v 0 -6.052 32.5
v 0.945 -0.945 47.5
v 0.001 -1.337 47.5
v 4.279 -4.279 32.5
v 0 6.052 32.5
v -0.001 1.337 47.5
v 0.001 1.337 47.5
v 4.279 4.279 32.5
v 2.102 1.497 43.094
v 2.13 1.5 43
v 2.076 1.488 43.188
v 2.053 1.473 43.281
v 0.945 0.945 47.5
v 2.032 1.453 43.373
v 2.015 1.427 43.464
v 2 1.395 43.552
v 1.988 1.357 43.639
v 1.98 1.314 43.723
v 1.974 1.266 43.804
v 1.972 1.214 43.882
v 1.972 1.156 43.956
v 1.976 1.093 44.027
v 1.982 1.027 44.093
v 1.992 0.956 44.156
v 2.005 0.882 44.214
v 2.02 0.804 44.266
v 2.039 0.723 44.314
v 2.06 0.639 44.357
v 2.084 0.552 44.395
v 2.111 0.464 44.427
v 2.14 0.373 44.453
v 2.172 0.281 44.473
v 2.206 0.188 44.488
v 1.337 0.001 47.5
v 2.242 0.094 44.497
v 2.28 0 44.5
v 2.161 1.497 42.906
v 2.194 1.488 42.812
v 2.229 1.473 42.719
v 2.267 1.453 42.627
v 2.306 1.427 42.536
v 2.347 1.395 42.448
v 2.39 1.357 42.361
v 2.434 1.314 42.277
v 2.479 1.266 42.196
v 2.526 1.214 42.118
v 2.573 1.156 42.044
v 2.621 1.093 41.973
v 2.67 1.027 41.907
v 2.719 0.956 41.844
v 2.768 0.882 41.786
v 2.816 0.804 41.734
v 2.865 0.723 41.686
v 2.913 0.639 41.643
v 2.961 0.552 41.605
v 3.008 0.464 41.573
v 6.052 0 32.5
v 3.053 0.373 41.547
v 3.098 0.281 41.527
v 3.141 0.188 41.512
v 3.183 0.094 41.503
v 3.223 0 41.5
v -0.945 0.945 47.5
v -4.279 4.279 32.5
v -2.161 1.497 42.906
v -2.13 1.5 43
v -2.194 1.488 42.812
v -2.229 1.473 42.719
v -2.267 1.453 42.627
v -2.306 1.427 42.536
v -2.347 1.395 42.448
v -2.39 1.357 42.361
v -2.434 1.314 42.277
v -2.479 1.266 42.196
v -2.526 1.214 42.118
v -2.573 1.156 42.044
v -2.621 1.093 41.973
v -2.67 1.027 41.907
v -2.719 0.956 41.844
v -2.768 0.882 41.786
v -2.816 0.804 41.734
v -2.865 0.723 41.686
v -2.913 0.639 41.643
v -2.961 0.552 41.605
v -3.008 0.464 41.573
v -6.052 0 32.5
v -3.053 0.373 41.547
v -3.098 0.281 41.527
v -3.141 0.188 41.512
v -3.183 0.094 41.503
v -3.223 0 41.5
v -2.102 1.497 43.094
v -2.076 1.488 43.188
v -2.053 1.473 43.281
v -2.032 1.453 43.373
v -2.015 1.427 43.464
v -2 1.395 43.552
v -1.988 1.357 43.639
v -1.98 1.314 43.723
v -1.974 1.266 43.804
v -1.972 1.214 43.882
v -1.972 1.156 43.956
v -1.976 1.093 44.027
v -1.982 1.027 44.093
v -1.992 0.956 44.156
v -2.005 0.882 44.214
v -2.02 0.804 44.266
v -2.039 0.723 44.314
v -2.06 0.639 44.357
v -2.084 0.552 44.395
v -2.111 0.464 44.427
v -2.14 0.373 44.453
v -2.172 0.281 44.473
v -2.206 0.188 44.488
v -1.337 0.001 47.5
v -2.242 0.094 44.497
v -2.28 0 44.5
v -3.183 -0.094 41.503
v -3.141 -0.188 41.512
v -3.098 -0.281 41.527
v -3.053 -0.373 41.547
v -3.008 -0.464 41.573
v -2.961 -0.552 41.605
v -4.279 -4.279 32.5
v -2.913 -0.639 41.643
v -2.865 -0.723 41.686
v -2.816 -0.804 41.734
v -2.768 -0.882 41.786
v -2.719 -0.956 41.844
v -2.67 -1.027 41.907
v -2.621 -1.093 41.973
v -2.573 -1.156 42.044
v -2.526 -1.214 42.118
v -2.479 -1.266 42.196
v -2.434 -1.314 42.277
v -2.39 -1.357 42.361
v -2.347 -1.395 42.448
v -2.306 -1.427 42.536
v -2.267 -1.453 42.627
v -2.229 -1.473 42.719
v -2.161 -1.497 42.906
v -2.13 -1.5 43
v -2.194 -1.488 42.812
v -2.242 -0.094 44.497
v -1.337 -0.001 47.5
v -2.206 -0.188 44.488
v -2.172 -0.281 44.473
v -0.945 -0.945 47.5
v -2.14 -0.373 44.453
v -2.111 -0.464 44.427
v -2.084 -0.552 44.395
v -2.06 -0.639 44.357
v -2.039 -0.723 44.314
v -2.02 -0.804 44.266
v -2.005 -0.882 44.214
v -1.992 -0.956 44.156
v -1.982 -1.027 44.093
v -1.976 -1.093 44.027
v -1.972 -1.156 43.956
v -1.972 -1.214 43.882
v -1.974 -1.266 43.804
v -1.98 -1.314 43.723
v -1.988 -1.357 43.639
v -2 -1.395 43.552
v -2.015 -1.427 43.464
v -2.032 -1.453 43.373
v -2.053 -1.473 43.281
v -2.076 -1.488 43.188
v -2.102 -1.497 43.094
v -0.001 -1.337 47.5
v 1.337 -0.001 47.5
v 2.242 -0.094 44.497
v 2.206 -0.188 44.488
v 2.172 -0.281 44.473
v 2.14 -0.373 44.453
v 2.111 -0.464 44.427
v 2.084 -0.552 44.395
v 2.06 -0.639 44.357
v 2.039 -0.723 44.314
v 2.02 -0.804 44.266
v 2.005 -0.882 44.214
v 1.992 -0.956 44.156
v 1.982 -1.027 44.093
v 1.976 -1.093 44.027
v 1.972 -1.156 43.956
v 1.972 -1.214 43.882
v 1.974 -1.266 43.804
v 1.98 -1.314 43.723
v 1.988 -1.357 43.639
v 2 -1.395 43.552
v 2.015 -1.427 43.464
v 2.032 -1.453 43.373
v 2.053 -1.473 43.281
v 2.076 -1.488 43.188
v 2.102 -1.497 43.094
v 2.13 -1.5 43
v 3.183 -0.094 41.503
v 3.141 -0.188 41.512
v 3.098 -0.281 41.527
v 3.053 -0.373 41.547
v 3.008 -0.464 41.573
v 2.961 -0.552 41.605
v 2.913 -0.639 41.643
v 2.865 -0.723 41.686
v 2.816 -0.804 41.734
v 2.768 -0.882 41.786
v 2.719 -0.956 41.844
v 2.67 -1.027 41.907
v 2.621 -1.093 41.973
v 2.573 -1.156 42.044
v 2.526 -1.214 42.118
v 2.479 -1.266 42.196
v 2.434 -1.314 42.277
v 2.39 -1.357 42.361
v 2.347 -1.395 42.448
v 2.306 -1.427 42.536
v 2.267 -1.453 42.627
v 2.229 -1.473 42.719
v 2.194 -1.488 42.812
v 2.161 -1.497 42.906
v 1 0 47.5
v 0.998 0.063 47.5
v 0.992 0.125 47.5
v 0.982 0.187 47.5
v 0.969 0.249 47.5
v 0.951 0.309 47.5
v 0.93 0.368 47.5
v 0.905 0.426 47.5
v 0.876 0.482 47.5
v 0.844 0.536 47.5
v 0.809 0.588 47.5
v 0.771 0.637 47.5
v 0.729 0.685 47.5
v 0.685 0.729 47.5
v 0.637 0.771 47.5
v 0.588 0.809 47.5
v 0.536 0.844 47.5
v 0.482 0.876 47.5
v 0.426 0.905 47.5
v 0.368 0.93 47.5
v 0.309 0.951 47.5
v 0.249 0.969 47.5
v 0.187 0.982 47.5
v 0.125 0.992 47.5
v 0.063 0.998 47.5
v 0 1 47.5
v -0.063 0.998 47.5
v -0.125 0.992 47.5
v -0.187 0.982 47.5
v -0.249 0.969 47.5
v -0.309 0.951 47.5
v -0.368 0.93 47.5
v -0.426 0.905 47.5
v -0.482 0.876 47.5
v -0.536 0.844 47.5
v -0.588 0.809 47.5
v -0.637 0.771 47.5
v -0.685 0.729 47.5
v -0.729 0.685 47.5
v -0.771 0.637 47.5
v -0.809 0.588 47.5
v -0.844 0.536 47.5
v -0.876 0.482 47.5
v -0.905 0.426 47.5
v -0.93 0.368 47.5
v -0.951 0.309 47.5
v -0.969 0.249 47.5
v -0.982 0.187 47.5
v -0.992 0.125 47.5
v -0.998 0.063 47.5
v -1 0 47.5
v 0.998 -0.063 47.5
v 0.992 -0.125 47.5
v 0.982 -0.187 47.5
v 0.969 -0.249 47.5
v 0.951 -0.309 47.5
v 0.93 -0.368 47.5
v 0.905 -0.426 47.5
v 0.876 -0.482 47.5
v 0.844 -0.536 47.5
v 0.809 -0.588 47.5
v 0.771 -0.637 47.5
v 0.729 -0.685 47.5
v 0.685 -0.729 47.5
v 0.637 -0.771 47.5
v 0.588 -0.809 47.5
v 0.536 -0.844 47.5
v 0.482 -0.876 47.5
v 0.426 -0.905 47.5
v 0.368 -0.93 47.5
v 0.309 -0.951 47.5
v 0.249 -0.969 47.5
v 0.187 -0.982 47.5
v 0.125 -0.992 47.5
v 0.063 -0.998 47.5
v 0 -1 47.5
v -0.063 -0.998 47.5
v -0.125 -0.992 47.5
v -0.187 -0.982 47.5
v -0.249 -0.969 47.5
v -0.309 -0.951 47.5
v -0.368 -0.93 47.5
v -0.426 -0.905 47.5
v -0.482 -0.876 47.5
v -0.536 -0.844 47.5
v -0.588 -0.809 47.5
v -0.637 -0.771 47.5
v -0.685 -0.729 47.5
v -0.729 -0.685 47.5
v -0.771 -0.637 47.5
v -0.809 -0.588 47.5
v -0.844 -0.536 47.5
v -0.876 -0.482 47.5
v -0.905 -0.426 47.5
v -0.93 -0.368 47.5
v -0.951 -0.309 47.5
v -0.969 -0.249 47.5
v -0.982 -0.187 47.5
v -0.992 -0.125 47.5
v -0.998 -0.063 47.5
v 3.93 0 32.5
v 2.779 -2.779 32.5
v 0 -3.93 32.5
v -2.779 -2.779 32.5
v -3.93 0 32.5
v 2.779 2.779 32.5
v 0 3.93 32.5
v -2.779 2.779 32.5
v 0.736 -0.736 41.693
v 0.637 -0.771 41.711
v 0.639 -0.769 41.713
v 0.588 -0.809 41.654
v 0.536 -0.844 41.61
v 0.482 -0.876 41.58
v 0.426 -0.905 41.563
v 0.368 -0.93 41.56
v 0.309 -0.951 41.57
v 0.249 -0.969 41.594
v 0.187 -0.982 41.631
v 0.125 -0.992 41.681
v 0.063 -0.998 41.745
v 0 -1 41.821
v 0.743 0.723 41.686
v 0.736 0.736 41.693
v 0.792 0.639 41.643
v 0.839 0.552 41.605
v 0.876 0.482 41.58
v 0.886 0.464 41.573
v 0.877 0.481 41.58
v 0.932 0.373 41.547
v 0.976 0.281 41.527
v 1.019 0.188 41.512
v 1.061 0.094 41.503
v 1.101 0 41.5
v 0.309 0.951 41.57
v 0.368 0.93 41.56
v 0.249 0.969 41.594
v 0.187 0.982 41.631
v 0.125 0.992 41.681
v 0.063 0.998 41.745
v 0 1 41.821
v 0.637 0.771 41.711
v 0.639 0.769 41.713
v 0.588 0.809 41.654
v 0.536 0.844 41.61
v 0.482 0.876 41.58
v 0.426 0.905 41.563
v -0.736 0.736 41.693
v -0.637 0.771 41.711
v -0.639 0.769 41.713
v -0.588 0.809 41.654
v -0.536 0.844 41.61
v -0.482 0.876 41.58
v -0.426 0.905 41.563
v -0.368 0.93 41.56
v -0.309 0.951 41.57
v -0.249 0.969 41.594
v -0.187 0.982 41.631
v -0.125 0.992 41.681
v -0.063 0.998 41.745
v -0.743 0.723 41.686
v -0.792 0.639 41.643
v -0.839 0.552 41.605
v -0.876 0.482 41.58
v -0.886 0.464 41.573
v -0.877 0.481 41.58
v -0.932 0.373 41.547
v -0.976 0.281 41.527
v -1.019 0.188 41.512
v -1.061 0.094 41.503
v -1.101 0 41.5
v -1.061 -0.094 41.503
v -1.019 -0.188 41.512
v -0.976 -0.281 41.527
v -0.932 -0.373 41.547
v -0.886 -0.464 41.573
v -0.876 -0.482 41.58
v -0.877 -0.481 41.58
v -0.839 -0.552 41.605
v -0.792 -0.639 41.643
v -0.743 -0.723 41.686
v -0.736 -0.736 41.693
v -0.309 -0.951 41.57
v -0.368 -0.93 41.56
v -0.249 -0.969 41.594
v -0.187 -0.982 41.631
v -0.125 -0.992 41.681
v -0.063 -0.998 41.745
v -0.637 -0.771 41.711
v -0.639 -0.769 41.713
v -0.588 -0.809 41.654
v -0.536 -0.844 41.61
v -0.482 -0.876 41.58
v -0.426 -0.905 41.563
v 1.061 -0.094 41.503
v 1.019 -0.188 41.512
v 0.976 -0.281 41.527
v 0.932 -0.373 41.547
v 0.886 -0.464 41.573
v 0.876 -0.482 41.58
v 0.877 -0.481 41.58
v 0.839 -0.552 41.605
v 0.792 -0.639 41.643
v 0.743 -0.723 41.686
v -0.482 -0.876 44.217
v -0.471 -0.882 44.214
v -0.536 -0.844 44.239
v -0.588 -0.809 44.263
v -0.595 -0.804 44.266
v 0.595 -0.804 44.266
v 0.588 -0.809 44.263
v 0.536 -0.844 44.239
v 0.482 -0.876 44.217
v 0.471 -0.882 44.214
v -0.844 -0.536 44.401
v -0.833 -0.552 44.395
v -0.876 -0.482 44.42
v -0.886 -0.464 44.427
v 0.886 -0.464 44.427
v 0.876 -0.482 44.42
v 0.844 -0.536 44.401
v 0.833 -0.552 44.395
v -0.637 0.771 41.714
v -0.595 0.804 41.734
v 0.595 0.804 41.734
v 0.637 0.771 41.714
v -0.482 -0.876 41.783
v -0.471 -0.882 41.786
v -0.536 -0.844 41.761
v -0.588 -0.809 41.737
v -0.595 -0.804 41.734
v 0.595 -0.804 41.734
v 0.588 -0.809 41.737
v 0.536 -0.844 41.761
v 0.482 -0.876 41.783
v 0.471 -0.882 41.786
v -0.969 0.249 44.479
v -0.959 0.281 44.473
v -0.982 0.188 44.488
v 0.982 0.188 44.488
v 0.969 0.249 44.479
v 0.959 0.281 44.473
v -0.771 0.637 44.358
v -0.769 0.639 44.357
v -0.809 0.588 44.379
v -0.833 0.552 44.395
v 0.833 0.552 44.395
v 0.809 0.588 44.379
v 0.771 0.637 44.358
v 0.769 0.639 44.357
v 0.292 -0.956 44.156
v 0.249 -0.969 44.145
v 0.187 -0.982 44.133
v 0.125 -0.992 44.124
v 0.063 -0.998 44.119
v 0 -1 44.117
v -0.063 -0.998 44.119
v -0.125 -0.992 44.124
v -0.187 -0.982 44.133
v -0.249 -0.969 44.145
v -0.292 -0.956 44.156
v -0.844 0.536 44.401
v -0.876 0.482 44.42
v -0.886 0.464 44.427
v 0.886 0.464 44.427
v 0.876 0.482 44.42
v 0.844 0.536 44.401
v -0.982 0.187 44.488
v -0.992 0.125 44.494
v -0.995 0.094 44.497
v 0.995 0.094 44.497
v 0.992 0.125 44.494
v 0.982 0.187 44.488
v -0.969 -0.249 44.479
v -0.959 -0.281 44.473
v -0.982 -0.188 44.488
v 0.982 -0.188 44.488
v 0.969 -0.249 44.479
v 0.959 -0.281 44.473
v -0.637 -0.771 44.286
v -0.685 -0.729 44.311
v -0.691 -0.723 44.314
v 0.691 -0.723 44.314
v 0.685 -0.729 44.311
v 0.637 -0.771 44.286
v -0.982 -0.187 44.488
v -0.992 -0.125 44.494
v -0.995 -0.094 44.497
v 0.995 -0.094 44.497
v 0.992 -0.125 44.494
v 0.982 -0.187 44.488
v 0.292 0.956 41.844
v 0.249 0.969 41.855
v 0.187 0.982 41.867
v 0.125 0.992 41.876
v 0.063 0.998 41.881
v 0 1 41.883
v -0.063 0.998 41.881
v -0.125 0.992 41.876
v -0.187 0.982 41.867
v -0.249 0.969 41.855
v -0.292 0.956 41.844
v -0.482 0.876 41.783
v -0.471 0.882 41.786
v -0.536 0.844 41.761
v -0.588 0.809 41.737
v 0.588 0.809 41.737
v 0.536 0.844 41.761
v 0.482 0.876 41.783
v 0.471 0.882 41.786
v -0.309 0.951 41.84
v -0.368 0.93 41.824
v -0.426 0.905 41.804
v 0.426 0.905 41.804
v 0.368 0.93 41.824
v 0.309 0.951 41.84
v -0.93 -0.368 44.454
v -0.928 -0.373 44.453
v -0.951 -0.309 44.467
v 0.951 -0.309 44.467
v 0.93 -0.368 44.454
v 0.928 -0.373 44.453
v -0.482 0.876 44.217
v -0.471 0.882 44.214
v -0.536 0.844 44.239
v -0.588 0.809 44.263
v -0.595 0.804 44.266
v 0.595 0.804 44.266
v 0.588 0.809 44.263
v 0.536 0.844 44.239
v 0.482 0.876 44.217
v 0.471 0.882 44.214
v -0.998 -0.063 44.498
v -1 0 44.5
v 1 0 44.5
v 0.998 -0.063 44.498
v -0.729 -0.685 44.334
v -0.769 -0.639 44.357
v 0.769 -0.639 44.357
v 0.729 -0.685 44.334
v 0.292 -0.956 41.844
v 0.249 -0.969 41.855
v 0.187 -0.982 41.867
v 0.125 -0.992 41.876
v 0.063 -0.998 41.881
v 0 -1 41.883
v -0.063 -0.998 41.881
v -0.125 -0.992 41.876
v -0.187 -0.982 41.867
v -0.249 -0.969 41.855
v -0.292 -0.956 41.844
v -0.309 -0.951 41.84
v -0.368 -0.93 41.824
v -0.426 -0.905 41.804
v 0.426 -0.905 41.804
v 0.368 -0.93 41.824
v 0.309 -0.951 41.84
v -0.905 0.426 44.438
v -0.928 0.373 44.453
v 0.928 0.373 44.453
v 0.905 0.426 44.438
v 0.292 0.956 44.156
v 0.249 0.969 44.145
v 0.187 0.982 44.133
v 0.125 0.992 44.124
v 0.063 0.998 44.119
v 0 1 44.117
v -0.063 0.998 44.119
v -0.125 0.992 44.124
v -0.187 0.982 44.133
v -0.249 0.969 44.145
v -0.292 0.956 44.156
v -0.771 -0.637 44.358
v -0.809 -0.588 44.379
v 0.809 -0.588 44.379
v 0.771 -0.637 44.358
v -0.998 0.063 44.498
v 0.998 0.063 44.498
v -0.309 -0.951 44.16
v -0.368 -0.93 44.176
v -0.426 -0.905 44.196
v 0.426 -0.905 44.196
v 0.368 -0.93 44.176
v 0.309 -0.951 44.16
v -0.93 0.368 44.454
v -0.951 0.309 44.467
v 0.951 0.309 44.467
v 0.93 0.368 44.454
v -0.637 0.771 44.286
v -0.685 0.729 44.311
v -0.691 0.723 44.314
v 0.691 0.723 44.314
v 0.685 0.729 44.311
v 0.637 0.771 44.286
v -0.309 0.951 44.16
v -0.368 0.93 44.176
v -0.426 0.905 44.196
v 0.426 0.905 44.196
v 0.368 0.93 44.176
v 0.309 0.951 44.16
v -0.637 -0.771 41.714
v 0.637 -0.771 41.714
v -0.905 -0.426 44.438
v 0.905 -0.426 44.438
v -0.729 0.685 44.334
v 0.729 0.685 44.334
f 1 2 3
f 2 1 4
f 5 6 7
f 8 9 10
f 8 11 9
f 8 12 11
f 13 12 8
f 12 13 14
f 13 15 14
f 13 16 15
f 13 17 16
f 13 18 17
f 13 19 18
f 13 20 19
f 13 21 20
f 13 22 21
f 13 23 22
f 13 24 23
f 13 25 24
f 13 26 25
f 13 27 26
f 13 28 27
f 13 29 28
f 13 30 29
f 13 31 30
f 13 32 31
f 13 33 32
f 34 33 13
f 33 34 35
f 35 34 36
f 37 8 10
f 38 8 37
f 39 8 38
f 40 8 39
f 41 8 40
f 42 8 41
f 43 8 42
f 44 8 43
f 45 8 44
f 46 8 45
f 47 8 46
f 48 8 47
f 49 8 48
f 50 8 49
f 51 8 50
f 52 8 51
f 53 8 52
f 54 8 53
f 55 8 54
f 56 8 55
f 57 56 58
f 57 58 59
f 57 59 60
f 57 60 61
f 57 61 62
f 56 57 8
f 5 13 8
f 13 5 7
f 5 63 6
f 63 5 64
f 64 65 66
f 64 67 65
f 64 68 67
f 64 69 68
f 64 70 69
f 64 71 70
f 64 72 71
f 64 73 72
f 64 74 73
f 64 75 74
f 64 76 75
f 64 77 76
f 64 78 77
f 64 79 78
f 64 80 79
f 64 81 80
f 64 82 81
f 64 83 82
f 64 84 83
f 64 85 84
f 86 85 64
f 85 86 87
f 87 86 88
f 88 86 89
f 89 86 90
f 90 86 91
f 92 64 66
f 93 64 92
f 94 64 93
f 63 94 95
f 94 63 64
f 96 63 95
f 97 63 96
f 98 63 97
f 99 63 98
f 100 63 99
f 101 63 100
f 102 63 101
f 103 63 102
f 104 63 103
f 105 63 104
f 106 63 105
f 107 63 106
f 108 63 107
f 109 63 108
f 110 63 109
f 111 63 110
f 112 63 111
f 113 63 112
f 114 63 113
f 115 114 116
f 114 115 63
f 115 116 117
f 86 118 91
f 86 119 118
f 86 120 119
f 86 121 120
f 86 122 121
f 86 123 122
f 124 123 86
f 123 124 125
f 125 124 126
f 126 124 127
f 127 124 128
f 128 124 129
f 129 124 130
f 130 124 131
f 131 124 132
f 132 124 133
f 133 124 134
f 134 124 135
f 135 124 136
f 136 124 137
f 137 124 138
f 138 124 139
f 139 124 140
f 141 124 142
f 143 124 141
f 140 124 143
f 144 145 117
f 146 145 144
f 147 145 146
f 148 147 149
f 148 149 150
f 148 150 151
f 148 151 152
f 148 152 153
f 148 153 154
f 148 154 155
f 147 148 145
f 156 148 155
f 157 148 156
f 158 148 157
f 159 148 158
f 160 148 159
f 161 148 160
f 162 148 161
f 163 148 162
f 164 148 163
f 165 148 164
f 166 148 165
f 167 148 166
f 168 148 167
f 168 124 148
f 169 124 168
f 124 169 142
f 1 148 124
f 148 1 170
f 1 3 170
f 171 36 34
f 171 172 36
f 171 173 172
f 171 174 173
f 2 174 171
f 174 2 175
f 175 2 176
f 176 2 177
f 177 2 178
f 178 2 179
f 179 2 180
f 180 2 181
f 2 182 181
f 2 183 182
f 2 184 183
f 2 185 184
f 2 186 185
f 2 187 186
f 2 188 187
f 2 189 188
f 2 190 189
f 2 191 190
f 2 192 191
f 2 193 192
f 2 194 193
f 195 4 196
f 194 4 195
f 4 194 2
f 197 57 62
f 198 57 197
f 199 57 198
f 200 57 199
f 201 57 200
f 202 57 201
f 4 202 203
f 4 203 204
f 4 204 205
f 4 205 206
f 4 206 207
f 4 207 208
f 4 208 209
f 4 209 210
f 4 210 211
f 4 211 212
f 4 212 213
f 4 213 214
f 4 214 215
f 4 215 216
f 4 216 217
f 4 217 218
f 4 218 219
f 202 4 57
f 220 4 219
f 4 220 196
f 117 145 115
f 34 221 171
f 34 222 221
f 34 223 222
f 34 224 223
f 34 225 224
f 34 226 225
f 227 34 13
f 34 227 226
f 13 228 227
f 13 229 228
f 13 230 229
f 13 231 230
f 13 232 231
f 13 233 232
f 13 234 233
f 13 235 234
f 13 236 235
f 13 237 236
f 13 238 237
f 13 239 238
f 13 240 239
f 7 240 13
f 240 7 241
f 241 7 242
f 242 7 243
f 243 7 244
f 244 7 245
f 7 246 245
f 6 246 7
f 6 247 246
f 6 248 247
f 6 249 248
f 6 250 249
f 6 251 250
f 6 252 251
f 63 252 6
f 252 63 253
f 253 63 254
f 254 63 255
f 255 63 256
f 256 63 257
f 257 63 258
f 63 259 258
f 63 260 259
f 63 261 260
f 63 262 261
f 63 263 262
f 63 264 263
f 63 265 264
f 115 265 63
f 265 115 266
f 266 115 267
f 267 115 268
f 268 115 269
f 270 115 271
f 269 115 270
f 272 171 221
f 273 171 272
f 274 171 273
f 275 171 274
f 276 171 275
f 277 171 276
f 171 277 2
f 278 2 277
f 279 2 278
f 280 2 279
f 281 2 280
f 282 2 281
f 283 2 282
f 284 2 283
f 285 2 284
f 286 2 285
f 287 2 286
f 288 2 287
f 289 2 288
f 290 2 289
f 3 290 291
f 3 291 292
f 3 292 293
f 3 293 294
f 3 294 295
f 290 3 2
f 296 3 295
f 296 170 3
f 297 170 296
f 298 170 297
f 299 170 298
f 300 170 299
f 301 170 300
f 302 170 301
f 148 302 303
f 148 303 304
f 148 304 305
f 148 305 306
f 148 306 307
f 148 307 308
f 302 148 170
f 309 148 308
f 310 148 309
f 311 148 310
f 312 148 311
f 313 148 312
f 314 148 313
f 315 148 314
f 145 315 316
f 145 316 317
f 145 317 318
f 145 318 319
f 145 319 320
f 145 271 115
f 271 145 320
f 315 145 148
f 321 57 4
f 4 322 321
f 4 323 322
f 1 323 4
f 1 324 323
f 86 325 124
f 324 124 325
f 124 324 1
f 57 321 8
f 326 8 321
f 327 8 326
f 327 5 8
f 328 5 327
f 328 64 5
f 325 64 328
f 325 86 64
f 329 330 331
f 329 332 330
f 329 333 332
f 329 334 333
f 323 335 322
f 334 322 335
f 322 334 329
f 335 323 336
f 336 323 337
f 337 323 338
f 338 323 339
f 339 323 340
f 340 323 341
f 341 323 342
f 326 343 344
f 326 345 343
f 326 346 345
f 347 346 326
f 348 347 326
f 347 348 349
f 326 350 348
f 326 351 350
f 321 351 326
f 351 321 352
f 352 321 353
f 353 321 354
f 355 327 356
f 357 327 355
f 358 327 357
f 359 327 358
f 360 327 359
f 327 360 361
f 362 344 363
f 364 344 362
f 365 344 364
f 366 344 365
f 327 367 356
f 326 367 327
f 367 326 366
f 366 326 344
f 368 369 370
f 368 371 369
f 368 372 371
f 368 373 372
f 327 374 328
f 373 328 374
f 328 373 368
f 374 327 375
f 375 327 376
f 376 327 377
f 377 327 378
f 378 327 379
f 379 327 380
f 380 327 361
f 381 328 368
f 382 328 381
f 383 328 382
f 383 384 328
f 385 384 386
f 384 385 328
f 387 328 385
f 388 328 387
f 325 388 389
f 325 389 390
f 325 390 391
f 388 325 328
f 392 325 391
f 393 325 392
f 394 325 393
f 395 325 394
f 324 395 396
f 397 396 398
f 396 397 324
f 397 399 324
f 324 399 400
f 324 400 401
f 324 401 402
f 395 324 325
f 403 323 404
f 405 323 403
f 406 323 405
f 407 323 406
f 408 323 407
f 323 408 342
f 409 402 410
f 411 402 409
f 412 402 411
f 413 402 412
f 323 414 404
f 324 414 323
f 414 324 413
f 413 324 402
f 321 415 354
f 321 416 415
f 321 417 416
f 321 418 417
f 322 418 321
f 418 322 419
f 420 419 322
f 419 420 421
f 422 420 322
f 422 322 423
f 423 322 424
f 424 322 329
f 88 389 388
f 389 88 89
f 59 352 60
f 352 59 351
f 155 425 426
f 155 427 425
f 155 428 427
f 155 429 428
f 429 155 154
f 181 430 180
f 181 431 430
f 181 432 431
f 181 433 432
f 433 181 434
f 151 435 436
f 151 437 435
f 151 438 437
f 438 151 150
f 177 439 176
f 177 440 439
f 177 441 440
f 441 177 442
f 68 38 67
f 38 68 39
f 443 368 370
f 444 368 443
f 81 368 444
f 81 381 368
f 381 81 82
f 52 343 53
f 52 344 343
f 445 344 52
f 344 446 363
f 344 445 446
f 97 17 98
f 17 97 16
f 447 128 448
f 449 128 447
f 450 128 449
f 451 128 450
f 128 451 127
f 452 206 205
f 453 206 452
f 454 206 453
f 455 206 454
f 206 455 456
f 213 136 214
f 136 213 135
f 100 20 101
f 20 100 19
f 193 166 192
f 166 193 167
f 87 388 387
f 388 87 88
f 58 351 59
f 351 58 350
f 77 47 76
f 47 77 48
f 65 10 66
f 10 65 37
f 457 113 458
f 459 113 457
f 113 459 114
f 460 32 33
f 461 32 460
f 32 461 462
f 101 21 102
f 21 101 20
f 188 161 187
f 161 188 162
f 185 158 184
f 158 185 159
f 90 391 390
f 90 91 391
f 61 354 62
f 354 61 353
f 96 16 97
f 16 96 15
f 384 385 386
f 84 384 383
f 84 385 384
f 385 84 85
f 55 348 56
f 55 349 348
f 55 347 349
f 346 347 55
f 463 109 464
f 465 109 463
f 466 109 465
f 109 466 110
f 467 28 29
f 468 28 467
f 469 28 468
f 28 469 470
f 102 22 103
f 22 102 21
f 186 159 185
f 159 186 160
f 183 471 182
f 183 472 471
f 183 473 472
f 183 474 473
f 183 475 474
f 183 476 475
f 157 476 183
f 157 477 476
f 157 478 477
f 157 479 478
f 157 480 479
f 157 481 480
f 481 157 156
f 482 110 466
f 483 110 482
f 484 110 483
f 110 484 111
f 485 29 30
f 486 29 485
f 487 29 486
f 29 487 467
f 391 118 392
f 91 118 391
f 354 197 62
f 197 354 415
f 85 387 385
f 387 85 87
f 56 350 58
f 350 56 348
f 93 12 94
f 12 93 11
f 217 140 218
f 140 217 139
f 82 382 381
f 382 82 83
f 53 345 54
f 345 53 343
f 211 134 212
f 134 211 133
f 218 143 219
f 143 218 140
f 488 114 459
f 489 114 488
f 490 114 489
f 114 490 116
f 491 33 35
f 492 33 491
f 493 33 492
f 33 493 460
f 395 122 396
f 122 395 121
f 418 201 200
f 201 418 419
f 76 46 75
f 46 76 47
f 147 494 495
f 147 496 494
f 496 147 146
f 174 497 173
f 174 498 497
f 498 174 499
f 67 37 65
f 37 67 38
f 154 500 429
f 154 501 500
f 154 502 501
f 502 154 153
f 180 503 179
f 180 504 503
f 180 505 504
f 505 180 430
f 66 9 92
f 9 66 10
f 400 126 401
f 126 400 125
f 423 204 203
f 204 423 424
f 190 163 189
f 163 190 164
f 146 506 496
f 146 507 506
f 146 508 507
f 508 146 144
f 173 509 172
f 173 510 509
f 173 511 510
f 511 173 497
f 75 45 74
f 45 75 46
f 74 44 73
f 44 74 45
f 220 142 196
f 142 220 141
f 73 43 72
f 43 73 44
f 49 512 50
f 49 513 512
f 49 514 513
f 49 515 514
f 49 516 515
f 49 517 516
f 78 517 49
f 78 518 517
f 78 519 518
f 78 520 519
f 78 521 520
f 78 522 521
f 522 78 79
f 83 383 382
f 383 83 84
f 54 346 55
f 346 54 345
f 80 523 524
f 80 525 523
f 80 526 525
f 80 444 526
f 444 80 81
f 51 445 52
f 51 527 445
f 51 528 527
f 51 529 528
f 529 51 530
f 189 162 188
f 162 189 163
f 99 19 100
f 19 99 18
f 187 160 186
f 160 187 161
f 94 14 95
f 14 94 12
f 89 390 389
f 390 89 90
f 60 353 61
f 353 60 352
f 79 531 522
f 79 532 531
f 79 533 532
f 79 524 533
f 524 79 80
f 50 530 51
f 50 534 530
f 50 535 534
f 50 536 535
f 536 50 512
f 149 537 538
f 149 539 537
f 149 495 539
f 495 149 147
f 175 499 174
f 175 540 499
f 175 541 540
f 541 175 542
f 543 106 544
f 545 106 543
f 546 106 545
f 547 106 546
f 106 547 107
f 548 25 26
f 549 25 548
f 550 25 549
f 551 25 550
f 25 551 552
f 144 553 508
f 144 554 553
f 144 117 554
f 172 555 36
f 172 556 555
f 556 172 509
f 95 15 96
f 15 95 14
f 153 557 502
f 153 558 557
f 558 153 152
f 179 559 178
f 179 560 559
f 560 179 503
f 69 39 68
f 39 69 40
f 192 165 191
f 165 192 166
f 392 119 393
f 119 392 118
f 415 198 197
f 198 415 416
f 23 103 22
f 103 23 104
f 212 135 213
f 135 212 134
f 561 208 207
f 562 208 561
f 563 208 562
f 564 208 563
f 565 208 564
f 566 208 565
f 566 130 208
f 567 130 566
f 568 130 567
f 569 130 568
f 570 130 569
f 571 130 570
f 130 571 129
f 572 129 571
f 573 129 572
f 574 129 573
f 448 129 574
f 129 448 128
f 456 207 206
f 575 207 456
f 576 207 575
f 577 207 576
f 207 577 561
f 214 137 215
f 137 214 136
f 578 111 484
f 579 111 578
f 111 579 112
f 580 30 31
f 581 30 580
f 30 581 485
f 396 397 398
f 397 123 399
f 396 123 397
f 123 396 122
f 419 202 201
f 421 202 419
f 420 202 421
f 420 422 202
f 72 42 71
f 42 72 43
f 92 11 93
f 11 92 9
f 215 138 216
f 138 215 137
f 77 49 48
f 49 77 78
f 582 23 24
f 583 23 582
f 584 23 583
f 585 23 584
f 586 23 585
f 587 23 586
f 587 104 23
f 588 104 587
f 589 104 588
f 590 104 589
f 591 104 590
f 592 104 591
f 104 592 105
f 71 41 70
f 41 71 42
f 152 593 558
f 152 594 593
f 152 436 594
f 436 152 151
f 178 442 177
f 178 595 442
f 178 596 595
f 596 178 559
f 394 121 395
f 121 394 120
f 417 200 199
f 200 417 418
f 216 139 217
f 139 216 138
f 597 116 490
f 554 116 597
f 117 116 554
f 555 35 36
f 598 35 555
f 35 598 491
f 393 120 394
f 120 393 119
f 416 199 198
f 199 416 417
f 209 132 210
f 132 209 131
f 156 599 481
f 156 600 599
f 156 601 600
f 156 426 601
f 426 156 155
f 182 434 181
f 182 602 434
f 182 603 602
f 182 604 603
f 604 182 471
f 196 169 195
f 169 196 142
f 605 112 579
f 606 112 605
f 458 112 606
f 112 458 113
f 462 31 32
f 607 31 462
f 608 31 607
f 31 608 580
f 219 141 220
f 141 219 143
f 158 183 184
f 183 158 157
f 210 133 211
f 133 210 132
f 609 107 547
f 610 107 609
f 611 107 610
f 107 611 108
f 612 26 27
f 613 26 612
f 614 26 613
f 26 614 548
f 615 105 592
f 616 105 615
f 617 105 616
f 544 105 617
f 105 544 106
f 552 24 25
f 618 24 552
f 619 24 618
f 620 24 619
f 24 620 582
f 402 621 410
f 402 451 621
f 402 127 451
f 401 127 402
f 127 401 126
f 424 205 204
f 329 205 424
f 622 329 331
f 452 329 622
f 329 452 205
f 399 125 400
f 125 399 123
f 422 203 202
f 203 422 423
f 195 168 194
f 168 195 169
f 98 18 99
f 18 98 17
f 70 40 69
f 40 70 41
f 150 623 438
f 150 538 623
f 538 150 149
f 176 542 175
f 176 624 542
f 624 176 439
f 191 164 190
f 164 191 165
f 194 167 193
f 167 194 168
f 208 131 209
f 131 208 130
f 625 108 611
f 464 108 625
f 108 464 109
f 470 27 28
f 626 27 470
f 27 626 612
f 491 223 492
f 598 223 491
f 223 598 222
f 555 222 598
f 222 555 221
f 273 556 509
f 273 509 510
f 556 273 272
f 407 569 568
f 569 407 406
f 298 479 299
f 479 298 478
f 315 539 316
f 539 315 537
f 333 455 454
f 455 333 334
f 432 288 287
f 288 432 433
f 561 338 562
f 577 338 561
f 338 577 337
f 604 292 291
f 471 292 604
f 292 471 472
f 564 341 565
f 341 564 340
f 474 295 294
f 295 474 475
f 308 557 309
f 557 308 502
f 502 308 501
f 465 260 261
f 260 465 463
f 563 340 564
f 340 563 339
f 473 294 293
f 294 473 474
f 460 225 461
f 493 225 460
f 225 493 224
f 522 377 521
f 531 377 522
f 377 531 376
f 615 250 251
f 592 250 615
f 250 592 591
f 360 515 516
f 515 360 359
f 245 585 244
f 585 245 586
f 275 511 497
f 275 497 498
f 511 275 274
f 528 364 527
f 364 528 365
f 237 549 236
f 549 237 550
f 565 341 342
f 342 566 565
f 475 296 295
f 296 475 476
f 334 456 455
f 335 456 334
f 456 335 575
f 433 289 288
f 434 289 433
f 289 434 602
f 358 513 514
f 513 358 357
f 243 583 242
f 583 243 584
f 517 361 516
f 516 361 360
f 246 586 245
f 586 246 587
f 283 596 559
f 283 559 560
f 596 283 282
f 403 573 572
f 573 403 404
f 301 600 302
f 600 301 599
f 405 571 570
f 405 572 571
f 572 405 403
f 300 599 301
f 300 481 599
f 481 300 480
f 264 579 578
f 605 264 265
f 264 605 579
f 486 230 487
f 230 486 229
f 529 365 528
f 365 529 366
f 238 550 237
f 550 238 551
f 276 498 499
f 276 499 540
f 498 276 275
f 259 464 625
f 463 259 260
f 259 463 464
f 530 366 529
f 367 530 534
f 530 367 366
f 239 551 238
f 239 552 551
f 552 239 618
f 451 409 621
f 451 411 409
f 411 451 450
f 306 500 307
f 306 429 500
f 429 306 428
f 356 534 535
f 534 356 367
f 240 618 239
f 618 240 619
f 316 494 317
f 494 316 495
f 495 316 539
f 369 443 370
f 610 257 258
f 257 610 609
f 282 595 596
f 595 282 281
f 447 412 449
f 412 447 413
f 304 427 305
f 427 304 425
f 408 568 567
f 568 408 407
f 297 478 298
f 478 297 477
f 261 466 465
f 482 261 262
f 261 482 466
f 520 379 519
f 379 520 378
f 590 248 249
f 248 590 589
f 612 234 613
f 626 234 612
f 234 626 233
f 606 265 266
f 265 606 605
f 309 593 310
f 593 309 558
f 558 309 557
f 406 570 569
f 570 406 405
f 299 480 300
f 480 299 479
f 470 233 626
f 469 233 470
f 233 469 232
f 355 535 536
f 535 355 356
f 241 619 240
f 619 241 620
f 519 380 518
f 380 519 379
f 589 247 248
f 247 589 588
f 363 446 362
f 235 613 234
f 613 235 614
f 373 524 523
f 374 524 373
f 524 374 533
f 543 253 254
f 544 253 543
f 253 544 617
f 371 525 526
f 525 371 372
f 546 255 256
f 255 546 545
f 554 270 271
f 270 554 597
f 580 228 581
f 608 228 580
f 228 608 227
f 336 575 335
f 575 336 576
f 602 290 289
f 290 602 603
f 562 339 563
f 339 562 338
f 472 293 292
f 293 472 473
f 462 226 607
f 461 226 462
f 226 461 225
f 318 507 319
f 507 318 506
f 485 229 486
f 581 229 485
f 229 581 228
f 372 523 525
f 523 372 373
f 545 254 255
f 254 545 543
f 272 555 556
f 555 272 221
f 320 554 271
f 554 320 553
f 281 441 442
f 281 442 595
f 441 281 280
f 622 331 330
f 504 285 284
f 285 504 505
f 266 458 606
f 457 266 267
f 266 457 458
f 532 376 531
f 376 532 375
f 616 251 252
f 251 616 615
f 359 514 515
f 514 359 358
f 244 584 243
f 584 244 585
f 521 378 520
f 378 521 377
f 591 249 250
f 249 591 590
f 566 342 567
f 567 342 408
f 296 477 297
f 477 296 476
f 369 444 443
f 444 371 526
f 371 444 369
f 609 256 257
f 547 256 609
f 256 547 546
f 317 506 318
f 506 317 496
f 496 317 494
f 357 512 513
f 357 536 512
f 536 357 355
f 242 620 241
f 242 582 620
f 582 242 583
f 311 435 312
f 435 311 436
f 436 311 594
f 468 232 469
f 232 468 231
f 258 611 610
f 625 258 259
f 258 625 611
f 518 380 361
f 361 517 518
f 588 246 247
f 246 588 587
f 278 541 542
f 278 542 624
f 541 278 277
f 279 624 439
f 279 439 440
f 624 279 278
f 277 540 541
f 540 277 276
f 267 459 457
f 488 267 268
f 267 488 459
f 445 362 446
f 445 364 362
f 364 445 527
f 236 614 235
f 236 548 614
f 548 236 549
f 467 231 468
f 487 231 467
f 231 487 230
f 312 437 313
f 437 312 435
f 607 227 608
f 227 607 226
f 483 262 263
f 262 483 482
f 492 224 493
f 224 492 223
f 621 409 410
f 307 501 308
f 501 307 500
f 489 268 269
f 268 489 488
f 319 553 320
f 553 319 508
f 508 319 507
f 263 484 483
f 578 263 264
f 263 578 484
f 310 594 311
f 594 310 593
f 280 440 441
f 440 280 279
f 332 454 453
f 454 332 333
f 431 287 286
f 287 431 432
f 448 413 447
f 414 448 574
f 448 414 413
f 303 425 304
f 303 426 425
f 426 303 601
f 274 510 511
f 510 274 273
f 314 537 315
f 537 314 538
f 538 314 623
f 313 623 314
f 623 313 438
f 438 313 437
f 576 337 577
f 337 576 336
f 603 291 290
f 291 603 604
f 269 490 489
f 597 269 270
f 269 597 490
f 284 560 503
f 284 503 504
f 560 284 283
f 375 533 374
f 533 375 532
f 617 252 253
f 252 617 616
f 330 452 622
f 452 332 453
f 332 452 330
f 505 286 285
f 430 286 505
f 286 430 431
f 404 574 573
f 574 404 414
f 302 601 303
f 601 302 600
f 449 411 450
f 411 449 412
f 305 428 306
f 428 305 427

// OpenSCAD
// file: KlaudiaNeckPendantMaster.scad
module PendantPrimitive()
{
   hull()
   { 
       linear_extrude(0.01)
       { 
           polygon(
             points=[ [10,10],[10*sqrt(2),0],[10,-10],[0,-10*sqrt(2)],
                      [-10,-10],[-10*sqrt(2),0],[-10,10],[0,10*sqrt(2)] ] // the 8 points at base
           );
       }
       translate([0,0,45]) cube(0.001,center=true);
   }   
}

module KlaudiaNeckPendant()
{
    difference()
    {
        
       union()
       {
           intersection()
           {
               union()
               {
                    PendantPrimitive();
                    scale([1,1,0.3]) mirror([0,0,1])PendantPrimitive();
               }
               cube(79.1,center=true);
           }
            // This part is broken off after the part is printed.   
            translate([0,0,40]) cylinder(d=30,h=1,center=true);
       } 
       difference()
       {
           translate([0,0,-14]) cube(5,center=true);
       } 
       // This hole through the length of this pendant ensures the resin drains out as it is printed. 
       cylinder(d=2,h=200,$fn=100,center=true);
    }
}

module KlaudiaNeckPendantCap()
{
    difference()
    {
        intersection()
        {
            scale([1.15,1.15,1.15])PendantPrimitive();
            translate([0,0,40]) cube([15,15,15],center=true);
        }
        PendantPrimitive();        
        translate([0,0,43]) rotate([0,90,0]) cylinder(d=3,h=200,$fn=100,center=true);
        // This hole through the length of this pendant ensures the resin drains out as it is printed. 
        cylinder(d=2,h=200,$fn=100,center=true);
    }
}

//KlaudiaNeckPendant();
//KlaudiaNeckPendantCap();
// main file
include <KlaudiaNeckPendantMaster.scad>;

KlaudiaNeckPendantCap();
